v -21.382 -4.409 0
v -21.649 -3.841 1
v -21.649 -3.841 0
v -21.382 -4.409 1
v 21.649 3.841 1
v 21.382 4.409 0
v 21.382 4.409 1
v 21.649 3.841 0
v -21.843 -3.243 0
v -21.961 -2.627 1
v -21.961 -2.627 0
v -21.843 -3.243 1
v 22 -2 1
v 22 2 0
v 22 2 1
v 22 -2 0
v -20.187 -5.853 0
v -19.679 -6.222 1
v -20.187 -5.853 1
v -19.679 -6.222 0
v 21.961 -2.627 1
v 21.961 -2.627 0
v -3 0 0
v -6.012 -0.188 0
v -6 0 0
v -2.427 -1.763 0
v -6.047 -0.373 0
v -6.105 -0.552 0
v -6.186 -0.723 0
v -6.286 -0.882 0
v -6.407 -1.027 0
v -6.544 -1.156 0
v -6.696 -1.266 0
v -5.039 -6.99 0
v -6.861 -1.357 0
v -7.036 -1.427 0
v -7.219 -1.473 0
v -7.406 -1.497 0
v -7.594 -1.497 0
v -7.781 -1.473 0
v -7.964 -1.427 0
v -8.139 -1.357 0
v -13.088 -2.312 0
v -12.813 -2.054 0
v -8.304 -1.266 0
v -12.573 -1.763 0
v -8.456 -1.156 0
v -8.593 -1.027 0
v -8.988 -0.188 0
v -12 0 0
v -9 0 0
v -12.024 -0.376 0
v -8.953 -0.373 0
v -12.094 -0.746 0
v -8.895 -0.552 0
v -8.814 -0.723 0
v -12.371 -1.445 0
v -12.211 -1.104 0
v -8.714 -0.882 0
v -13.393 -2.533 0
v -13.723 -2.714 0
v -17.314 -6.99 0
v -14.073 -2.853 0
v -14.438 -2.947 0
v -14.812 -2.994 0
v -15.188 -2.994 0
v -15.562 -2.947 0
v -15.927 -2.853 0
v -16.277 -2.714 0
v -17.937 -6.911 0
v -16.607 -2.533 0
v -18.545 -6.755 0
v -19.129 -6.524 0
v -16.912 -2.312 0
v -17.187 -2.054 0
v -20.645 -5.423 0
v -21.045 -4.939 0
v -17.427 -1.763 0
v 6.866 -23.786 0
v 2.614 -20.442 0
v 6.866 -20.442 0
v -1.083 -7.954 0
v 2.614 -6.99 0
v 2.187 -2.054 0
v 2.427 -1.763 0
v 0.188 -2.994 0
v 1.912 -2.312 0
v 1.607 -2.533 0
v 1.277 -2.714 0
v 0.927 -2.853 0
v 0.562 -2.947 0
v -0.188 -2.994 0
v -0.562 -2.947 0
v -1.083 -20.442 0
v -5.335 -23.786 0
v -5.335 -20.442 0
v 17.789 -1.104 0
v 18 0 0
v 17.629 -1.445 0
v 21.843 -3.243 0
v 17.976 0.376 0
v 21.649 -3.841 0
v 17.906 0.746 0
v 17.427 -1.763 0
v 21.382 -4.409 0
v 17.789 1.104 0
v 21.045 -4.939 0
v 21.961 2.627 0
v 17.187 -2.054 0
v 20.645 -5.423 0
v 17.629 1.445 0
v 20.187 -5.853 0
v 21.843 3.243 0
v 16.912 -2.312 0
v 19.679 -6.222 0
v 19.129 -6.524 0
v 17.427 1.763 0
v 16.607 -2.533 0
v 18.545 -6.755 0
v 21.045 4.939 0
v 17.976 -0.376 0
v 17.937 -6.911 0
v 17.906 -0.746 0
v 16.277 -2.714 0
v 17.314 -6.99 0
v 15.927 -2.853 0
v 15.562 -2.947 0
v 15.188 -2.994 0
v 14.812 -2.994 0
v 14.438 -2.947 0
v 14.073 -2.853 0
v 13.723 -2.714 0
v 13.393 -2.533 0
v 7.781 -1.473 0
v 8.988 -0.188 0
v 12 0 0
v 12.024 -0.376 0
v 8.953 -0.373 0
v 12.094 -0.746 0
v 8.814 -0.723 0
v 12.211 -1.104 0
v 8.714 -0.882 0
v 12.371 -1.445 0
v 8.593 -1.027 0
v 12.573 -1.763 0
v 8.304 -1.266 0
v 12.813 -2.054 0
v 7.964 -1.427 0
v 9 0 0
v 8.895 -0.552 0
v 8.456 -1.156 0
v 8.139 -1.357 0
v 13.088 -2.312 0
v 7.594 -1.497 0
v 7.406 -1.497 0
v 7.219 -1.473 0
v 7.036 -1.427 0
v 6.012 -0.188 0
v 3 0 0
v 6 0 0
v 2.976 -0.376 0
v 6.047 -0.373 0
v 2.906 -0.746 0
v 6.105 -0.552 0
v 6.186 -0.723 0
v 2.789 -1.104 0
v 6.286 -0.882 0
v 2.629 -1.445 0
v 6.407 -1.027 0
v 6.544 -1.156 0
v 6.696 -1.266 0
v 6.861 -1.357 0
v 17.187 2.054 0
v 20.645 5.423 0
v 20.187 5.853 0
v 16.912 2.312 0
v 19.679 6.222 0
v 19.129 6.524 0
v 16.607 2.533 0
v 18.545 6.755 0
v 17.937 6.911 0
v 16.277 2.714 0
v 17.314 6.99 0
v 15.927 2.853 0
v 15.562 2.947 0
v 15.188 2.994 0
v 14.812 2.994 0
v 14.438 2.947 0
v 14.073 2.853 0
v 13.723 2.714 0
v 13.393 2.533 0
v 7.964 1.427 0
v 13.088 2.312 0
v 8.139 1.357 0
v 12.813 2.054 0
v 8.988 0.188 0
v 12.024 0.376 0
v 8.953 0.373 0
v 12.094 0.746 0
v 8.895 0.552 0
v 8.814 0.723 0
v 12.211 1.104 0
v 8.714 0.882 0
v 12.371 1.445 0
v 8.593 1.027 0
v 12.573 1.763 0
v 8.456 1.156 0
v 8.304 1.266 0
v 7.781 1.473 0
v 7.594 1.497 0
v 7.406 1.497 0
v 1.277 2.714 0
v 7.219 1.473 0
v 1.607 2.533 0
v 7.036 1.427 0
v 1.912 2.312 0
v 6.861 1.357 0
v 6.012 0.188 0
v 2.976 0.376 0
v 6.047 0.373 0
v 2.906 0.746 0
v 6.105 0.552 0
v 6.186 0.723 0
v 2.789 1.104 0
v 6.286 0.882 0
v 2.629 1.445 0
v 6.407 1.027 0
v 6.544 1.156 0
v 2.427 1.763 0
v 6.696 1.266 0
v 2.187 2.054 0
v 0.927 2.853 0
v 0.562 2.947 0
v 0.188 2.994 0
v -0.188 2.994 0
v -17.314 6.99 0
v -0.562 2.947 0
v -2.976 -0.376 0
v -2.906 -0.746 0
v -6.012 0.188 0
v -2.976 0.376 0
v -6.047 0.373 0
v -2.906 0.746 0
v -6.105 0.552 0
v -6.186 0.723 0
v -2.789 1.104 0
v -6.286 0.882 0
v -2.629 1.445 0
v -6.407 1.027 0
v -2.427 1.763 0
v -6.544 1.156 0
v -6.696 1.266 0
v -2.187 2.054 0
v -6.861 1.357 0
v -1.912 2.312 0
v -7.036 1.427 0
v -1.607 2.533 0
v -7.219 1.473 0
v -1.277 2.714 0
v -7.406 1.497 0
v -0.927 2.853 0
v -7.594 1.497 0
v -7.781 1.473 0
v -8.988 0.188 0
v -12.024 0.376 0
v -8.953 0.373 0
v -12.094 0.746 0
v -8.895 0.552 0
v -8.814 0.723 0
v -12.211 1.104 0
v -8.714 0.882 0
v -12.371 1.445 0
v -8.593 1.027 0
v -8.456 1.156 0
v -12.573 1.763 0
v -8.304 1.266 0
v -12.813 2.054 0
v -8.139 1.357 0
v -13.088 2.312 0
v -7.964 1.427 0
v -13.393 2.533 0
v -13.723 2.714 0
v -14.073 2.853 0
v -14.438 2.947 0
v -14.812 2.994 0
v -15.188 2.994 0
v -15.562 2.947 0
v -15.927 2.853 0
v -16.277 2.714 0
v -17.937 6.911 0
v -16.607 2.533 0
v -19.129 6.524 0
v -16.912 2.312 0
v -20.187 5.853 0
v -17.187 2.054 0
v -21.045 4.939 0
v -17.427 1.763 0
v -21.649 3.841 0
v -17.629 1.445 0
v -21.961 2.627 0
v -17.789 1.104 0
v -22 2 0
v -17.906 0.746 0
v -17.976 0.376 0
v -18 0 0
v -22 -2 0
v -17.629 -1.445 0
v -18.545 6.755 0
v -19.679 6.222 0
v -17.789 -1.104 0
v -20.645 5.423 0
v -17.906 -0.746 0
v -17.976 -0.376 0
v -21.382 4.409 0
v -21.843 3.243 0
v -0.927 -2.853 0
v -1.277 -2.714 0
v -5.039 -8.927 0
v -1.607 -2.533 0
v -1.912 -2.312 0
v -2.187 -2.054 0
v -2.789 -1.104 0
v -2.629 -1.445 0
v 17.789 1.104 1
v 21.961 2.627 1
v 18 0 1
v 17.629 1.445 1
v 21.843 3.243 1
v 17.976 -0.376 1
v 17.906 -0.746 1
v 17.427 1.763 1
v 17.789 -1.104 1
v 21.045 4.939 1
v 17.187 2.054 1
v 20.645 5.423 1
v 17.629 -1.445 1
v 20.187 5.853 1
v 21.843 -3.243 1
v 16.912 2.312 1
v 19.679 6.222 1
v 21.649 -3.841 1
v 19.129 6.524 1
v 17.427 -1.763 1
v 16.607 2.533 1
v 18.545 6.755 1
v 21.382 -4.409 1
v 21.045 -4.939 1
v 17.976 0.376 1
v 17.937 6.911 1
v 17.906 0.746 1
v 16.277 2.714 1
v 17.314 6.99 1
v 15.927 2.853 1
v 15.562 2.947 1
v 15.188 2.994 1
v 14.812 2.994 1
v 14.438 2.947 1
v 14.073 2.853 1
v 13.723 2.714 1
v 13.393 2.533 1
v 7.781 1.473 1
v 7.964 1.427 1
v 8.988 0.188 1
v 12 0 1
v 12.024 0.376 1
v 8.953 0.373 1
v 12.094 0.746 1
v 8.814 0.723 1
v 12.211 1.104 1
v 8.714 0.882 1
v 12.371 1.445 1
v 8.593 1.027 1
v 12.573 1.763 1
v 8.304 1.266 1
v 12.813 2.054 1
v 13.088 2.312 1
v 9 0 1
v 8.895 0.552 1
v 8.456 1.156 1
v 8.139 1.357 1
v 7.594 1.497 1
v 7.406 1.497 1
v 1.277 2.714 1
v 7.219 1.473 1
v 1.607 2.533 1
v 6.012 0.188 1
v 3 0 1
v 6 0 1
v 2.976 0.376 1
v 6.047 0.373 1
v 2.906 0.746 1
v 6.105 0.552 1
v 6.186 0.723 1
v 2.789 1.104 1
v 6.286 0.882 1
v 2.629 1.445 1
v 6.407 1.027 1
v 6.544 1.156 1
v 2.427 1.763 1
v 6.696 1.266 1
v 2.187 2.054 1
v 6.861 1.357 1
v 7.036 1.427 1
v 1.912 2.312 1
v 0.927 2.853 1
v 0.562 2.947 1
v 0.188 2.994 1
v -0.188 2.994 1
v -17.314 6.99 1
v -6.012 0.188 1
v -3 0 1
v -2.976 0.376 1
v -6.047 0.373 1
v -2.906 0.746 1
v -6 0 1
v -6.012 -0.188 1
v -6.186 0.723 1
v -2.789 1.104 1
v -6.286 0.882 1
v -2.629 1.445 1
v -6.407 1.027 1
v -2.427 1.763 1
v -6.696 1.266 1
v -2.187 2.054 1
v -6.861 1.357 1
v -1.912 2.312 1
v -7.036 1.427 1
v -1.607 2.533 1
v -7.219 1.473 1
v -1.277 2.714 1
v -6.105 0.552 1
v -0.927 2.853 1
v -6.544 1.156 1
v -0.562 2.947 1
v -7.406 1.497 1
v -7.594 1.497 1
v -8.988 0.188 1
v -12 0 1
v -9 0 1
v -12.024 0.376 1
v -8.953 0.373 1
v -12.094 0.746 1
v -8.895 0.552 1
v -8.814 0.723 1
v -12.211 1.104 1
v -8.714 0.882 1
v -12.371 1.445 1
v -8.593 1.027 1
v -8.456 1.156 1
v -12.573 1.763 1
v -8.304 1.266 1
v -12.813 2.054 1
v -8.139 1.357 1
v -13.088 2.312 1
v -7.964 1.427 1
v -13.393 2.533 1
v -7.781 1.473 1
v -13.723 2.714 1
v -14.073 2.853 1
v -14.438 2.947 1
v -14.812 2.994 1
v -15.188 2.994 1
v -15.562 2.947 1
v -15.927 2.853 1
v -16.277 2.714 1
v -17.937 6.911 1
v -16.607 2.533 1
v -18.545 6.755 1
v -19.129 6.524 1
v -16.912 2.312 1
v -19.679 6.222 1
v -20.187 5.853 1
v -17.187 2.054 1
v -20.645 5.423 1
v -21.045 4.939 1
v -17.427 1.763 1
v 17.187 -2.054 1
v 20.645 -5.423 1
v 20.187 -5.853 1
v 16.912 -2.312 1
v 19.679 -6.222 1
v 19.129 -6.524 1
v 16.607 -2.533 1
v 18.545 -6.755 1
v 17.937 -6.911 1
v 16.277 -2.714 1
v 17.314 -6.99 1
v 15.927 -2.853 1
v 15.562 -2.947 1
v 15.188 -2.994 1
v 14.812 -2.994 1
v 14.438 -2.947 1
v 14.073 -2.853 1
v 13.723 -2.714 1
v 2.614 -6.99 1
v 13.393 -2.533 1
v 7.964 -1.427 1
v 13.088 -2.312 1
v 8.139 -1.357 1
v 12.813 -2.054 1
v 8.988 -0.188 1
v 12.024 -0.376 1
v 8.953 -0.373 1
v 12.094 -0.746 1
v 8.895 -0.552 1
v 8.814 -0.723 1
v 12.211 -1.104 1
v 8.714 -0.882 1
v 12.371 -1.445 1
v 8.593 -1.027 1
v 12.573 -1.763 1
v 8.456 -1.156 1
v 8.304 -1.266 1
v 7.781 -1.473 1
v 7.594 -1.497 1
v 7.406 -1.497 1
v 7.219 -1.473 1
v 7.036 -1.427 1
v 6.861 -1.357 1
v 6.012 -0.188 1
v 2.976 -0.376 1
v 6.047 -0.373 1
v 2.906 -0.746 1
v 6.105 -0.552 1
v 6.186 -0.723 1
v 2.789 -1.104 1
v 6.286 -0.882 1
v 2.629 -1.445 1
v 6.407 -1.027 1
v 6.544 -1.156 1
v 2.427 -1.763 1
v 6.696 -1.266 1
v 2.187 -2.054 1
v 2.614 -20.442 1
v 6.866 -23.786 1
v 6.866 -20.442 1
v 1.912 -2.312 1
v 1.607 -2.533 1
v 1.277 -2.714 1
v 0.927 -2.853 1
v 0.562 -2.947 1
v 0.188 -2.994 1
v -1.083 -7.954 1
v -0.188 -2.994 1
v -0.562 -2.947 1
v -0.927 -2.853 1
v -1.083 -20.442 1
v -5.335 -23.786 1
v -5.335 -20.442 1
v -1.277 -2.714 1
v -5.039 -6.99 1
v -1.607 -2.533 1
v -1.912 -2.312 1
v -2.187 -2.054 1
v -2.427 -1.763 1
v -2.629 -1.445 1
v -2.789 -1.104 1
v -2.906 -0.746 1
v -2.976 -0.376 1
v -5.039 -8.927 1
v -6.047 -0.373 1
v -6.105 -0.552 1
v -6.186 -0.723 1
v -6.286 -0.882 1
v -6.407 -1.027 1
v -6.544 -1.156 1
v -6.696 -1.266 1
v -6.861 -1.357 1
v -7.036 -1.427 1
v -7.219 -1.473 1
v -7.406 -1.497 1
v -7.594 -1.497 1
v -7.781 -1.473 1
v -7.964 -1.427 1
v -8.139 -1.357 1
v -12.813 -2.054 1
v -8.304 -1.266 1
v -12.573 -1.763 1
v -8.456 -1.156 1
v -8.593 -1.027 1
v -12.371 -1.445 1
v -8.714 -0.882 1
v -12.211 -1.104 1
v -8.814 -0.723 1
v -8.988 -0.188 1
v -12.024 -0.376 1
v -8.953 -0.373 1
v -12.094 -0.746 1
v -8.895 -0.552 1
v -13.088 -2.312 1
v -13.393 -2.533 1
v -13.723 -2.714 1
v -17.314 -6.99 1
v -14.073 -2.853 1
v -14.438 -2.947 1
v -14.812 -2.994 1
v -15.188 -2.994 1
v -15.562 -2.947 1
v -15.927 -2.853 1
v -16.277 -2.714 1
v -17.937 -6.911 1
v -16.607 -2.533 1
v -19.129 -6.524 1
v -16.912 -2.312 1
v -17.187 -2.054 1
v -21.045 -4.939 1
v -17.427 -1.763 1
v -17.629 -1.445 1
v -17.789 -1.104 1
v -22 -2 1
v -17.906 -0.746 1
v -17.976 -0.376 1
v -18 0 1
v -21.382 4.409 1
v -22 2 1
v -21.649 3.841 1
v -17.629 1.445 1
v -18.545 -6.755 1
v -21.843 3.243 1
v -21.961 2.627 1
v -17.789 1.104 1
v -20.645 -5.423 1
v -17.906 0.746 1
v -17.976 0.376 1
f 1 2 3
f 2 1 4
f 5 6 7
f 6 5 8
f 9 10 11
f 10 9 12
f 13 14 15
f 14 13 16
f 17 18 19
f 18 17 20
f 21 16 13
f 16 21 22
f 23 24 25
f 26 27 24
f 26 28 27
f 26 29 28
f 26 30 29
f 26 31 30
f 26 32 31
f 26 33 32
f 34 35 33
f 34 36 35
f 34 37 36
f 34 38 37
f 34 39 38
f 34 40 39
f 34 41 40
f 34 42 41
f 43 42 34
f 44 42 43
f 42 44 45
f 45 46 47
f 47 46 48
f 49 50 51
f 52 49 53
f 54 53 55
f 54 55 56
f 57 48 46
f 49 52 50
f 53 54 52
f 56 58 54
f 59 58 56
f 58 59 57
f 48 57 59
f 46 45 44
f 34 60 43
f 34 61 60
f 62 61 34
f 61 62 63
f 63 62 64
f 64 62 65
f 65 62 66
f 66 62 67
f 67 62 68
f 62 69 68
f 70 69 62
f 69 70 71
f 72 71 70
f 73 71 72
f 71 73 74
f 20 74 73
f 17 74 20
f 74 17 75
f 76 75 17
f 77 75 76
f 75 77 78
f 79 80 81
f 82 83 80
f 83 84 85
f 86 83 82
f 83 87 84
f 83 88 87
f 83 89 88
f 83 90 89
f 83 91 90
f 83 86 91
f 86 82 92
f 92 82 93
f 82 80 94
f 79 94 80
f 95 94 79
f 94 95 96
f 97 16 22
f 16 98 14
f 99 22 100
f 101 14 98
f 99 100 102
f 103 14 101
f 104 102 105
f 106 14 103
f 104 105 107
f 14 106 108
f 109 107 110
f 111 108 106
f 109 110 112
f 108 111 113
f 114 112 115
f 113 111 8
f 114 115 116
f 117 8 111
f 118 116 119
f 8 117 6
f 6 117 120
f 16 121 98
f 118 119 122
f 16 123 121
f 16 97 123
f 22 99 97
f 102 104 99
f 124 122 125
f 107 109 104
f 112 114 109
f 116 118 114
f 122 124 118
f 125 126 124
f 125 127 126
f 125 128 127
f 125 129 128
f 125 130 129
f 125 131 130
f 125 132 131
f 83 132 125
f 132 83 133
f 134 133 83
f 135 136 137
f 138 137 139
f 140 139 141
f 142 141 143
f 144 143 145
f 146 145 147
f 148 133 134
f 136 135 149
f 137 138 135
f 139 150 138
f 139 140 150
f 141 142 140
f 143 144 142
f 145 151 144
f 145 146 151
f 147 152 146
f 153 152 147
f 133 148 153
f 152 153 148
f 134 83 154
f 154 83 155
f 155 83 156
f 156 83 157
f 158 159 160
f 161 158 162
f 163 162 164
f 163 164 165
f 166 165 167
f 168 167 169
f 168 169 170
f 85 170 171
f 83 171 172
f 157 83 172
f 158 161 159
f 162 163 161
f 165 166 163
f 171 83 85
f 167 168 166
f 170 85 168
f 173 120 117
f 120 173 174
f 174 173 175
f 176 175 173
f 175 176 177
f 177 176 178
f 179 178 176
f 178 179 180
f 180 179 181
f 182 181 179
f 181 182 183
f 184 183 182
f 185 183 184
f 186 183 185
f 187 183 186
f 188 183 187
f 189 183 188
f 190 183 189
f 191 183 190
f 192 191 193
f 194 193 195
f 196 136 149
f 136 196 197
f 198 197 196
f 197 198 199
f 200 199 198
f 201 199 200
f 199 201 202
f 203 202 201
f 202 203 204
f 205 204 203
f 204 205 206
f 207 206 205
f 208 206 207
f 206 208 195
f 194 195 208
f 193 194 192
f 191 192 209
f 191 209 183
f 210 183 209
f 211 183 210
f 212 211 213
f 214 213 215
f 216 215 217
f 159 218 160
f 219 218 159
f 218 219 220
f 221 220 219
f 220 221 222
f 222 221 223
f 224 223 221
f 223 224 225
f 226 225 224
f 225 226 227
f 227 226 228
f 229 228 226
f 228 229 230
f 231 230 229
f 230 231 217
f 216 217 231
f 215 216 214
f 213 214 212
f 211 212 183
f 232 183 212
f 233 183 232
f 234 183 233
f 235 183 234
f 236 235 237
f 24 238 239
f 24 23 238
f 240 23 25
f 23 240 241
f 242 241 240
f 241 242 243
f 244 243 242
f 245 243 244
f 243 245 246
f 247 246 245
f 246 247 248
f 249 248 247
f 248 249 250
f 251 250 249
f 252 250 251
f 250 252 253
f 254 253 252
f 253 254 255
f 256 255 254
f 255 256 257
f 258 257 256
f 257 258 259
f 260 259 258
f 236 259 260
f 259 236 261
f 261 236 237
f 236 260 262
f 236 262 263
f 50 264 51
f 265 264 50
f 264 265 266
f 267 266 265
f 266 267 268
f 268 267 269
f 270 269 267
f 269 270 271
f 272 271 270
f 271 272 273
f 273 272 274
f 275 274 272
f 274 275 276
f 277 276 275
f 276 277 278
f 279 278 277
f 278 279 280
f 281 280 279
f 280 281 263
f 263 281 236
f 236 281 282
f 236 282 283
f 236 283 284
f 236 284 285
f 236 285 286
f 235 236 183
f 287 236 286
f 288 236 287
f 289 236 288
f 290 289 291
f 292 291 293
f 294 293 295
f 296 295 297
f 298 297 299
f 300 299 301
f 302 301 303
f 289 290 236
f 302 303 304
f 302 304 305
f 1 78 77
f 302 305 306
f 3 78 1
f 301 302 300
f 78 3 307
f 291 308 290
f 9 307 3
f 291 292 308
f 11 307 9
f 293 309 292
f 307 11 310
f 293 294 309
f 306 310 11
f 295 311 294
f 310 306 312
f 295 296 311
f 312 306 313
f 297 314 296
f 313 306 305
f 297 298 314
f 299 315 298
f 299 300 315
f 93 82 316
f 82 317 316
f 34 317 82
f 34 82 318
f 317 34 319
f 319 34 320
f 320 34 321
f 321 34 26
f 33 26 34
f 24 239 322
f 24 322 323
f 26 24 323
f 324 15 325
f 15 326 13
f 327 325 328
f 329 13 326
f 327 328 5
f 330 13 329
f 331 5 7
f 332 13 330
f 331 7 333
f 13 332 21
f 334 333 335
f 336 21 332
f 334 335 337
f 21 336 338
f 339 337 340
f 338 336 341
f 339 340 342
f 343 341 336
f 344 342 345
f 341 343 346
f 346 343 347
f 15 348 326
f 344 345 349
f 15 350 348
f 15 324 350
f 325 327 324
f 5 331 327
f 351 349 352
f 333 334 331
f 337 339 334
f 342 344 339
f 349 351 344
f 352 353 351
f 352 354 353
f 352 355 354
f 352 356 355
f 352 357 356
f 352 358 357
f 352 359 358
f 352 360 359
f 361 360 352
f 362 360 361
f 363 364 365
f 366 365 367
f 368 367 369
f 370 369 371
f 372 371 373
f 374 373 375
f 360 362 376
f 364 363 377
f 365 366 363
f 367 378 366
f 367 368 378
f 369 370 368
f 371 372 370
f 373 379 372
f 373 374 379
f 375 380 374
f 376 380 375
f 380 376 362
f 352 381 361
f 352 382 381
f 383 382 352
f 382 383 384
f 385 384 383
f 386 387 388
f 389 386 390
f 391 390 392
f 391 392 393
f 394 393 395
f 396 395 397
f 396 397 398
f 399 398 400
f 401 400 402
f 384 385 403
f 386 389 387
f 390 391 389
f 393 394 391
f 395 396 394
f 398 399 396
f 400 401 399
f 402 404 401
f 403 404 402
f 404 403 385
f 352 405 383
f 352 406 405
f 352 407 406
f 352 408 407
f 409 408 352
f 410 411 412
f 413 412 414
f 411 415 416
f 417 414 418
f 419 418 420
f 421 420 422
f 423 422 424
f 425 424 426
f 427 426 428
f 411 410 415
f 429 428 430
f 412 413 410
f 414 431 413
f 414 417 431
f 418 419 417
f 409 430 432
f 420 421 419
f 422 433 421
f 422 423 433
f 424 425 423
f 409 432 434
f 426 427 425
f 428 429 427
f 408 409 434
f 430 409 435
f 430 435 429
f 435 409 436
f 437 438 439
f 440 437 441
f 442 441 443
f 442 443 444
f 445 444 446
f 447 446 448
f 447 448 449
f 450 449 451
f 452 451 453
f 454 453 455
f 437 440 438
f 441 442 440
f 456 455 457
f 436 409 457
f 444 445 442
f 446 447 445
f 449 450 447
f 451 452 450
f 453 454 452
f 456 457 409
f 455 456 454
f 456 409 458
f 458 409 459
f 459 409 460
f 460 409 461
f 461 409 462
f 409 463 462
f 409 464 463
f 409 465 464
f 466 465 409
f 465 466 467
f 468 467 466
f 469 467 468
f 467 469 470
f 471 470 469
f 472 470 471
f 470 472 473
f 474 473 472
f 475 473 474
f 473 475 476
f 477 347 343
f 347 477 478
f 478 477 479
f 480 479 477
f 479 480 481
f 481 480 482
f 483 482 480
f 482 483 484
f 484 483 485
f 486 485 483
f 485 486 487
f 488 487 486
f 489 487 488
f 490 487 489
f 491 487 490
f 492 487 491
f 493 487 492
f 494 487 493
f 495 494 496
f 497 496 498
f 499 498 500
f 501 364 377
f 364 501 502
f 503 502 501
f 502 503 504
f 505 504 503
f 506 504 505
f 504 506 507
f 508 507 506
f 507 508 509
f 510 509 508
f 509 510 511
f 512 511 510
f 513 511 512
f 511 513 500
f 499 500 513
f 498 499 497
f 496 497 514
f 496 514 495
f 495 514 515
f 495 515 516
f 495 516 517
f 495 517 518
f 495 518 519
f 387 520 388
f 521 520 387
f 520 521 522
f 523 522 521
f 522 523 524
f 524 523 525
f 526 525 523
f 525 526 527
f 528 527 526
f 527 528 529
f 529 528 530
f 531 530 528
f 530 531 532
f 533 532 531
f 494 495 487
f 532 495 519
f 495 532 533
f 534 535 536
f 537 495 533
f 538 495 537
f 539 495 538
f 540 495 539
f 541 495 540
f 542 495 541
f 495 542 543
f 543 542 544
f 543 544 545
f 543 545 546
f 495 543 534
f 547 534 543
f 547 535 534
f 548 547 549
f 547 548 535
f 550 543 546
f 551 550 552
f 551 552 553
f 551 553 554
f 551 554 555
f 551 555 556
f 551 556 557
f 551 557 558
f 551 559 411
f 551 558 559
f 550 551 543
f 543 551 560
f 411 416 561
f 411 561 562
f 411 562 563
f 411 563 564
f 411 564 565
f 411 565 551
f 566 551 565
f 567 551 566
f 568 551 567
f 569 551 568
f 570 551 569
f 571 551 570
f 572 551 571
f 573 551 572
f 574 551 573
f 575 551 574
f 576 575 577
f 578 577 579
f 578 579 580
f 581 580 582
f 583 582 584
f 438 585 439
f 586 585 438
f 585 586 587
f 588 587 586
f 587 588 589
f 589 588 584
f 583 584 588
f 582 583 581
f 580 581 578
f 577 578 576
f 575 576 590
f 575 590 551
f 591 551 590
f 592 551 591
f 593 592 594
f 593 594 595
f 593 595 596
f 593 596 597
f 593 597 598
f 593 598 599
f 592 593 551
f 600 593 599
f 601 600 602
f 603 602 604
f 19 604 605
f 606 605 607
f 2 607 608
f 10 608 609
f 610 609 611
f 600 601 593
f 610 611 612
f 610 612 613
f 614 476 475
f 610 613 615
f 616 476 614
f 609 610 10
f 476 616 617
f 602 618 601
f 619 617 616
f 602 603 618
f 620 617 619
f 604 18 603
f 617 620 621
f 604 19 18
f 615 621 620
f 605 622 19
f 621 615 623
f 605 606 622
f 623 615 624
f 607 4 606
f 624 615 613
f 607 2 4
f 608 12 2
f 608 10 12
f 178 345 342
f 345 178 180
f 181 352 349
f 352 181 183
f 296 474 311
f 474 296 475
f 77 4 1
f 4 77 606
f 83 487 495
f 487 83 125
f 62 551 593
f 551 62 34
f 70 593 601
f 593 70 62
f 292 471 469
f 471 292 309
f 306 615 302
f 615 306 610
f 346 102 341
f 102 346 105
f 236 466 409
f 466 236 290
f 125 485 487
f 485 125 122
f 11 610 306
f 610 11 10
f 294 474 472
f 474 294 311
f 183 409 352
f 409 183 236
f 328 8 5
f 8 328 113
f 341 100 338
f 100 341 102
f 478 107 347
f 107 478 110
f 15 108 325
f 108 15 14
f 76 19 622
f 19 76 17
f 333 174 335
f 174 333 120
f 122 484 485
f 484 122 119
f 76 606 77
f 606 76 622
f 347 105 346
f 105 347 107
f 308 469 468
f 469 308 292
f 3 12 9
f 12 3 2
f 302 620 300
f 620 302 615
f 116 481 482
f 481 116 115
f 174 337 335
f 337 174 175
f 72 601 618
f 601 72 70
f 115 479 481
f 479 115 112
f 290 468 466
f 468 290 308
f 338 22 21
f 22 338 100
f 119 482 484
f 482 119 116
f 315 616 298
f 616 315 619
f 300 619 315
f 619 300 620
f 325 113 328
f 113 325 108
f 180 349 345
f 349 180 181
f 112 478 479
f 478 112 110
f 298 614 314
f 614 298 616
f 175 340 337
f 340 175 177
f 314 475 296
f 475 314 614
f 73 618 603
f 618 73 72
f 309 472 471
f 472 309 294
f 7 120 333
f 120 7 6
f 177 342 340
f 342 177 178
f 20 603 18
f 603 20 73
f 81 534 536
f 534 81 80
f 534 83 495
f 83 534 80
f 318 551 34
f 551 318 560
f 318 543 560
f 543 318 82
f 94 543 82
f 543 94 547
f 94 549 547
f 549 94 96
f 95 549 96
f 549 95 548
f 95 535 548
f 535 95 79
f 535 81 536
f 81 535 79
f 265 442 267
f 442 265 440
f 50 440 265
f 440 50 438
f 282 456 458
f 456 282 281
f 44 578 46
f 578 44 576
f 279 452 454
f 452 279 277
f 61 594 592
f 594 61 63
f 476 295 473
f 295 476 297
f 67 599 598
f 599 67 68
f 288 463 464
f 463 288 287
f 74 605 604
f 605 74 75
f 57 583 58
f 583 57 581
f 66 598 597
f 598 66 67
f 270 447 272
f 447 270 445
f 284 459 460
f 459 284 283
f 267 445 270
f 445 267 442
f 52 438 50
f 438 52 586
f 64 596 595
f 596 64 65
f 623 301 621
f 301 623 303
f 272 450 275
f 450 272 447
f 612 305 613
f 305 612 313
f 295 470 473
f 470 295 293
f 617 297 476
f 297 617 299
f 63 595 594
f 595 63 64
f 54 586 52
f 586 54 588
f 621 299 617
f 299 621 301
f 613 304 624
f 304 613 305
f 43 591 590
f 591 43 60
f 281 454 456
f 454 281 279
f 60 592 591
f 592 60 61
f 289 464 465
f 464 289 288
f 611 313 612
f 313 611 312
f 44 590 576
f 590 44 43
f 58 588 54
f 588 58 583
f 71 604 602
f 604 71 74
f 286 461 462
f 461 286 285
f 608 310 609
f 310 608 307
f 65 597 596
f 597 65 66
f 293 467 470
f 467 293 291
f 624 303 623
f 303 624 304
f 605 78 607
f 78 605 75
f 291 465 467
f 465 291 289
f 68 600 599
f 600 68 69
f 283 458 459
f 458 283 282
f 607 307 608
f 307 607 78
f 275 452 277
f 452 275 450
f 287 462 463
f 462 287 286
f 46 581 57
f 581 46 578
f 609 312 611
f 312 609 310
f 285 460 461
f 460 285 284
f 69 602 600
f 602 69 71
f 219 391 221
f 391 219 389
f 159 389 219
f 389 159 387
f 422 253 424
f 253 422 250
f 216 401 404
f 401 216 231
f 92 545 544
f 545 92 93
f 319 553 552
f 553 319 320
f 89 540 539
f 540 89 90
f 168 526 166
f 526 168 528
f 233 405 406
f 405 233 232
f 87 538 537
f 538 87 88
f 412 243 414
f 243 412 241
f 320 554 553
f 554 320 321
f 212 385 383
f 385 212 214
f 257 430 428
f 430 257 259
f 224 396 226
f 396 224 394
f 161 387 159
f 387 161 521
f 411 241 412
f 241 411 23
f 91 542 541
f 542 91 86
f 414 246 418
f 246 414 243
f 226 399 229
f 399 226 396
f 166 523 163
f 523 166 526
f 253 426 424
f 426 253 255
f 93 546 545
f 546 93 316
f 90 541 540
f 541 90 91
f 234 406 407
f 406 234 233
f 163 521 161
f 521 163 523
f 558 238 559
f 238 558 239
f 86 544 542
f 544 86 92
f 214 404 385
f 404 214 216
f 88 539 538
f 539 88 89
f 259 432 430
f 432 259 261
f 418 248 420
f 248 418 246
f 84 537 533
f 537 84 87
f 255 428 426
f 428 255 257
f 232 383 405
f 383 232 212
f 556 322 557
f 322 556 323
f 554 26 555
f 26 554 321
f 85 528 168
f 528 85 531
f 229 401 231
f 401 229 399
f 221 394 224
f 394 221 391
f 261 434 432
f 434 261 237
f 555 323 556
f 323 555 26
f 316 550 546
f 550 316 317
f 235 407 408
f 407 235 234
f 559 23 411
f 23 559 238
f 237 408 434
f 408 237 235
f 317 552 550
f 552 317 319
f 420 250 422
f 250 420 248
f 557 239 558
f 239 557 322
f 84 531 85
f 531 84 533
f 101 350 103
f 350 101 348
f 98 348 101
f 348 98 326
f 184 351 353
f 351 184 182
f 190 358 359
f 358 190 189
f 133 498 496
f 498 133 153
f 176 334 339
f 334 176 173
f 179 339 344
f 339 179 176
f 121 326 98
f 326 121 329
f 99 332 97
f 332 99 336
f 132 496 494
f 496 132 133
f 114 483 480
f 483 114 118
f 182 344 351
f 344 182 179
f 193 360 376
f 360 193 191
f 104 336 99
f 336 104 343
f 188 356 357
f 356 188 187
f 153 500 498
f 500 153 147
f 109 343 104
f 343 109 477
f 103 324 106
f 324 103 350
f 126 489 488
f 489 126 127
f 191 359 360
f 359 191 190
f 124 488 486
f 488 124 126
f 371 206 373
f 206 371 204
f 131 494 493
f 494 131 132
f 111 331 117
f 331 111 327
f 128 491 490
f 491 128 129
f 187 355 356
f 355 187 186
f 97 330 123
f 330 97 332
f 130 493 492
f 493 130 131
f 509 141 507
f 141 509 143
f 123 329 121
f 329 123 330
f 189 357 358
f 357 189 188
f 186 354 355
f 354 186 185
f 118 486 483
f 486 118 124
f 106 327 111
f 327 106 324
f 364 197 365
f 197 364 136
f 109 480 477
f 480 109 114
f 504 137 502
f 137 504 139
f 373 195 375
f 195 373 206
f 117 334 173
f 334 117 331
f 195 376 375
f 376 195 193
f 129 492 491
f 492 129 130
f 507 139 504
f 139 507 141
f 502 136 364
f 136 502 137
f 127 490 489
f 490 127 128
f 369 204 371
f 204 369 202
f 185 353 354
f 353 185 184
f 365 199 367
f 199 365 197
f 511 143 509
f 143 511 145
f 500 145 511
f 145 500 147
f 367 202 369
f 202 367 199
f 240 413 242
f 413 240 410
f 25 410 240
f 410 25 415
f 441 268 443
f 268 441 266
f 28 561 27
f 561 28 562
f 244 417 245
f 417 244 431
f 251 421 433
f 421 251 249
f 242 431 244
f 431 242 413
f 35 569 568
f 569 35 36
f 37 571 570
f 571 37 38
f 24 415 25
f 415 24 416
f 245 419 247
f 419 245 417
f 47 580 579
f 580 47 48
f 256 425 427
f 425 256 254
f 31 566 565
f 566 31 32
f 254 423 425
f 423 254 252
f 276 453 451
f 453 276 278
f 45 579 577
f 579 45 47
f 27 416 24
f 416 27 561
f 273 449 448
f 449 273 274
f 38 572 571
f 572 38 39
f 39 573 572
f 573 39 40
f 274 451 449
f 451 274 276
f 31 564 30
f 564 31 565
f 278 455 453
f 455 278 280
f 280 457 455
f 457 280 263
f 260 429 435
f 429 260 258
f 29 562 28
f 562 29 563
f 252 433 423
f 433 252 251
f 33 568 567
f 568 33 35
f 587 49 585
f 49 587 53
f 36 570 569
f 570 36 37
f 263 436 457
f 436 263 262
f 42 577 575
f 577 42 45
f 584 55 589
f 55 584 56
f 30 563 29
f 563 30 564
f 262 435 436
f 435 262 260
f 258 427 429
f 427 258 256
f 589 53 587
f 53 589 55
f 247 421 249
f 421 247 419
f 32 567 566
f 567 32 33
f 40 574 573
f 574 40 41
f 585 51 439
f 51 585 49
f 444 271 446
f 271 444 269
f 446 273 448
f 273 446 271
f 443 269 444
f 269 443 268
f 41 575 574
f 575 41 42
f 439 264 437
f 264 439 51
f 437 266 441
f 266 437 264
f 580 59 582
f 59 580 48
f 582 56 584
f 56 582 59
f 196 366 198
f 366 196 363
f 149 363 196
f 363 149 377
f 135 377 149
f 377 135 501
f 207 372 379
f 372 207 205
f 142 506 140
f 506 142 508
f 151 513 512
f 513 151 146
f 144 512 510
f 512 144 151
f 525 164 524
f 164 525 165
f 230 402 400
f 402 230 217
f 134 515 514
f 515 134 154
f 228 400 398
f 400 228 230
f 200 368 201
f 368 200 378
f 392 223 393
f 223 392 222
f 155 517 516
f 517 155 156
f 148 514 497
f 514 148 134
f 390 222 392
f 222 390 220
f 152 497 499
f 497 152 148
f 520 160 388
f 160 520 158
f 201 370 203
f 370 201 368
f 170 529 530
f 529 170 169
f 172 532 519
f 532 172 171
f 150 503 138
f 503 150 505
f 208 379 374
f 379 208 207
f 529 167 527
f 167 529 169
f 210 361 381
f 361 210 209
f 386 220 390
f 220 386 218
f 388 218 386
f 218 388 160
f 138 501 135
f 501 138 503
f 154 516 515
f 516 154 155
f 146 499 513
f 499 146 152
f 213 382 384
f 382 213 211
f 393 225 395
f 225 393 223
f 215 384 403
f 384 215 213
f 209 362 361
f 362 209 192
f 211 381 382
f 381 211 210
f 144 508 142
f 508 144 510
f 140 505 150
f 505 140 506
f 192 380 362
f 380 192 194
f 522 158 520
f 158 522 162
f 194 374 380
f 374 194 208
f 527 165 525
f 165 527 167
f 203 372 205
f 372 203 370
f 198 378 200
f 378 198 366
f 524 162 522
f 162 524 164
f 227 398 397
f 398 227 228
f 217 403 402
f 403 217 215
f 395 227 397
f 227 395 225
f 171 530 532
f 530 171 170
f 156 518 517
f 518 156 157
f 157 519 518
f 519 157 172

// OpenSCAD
$fn = 50;


difference() {
	union() {
		*color(alpha = 1.0000000000, c = "gray") {
			translate(v = [0, 14, 0]) {
				linear_extrude(height = 1) {
					text(font = "Arial:style=Bold", halign = "center", size = 4.5000000000, text = "COMMENT description oobb_plate_shape_p_type_1_depth_3_width_1_thickness_1_extra_oobb_size", valign = "center");
				}
			}
		}
		hull() {
			translate(v = [-17.0000000000, 2.0000000000, 0]) {
				cylinder(h = 1, r = 5);
			}
			translate(v = [17.0000000000, 2.0000000000, 0]) {
				cylinder(h = 1, r = 5);
			}
			translate(v = [-17.0000000000, -2.0000000000, 0]) {
				cylinder(h = 1, r = 5);
			}
			translate(v = [17.0000000000, -2.0000000000, 0]) {
				cylinder(h = 1, r = 5);
			}
		}
		translate(v = [0, -5, 0]) {
			linear_extrude(height = 1) {
				text(font = "DejaVu Sans Mono:style=Bold", halign = "center", size = 19.0000000000, text = "1", valign = "top");
			}
		}
	}
	union() {
		*color(alpha = 1.0000000000, c = "gray") {
			translate(v = [0, 14, 0]) {
				linear_extrude(height = 1) {
					text(font = "Arial:style=Bold", halign = "center", size = 4.5000000000, text = "COMMENT description oobb_holes_shape_n_type_3_width_1_thickness_1_extra_oobb_size_1_height_'all'_holes_true_both_holes", valign = "center");
				}
			}
		}
		translate(v = [-15.0000000000, 0.0000000000, 0]) {
			translate(v = [0, 0, -50]) {
				cylinder(h = 100, r = 3.0000000000);
			}
		}
		translate(v = [0, 0, -50]) {
			cylinder(h = 100, r = 3.0000000000);
		}
		translate(v = [15.0000000000, 0.0000000000, 0]) {
			translate(v = [0, 0, -50]) {
				cylinder(h = 100, r = 3.0000000000);
			}
		}
		translate(v = [-15.0000000000, 0.0000000000, 0]) {
			translate(v = [0, 0, -50]) {
				cylinder(h = 100, r = 1.5000000000);
			}
		}
		translate(v = [-7.5000000000, 0.0000000000, 0]) {
			translate(v = [0, 0, -50]) {
				cylinder(h = 100, r = 1.5000000000);
			}
		}
		translate(v = [0, 0, -50]) {
			cylinder(h = 100, r = 1.5000000000);
		}
		translate(v = [7.5000000000, 0.0000000000, 0]) {
			translate(v = [0, 0, -50]) {
				cylinder(h = 100, r = 1.5000000000);
			}
		}
		translate(v = [15.0000000000, 0.0000000000, 0]) {
			translate(v = [0, 0, -50]) {
				cylinder(h = 100, r = 1.5000000000);
			}
		}
	}
}
